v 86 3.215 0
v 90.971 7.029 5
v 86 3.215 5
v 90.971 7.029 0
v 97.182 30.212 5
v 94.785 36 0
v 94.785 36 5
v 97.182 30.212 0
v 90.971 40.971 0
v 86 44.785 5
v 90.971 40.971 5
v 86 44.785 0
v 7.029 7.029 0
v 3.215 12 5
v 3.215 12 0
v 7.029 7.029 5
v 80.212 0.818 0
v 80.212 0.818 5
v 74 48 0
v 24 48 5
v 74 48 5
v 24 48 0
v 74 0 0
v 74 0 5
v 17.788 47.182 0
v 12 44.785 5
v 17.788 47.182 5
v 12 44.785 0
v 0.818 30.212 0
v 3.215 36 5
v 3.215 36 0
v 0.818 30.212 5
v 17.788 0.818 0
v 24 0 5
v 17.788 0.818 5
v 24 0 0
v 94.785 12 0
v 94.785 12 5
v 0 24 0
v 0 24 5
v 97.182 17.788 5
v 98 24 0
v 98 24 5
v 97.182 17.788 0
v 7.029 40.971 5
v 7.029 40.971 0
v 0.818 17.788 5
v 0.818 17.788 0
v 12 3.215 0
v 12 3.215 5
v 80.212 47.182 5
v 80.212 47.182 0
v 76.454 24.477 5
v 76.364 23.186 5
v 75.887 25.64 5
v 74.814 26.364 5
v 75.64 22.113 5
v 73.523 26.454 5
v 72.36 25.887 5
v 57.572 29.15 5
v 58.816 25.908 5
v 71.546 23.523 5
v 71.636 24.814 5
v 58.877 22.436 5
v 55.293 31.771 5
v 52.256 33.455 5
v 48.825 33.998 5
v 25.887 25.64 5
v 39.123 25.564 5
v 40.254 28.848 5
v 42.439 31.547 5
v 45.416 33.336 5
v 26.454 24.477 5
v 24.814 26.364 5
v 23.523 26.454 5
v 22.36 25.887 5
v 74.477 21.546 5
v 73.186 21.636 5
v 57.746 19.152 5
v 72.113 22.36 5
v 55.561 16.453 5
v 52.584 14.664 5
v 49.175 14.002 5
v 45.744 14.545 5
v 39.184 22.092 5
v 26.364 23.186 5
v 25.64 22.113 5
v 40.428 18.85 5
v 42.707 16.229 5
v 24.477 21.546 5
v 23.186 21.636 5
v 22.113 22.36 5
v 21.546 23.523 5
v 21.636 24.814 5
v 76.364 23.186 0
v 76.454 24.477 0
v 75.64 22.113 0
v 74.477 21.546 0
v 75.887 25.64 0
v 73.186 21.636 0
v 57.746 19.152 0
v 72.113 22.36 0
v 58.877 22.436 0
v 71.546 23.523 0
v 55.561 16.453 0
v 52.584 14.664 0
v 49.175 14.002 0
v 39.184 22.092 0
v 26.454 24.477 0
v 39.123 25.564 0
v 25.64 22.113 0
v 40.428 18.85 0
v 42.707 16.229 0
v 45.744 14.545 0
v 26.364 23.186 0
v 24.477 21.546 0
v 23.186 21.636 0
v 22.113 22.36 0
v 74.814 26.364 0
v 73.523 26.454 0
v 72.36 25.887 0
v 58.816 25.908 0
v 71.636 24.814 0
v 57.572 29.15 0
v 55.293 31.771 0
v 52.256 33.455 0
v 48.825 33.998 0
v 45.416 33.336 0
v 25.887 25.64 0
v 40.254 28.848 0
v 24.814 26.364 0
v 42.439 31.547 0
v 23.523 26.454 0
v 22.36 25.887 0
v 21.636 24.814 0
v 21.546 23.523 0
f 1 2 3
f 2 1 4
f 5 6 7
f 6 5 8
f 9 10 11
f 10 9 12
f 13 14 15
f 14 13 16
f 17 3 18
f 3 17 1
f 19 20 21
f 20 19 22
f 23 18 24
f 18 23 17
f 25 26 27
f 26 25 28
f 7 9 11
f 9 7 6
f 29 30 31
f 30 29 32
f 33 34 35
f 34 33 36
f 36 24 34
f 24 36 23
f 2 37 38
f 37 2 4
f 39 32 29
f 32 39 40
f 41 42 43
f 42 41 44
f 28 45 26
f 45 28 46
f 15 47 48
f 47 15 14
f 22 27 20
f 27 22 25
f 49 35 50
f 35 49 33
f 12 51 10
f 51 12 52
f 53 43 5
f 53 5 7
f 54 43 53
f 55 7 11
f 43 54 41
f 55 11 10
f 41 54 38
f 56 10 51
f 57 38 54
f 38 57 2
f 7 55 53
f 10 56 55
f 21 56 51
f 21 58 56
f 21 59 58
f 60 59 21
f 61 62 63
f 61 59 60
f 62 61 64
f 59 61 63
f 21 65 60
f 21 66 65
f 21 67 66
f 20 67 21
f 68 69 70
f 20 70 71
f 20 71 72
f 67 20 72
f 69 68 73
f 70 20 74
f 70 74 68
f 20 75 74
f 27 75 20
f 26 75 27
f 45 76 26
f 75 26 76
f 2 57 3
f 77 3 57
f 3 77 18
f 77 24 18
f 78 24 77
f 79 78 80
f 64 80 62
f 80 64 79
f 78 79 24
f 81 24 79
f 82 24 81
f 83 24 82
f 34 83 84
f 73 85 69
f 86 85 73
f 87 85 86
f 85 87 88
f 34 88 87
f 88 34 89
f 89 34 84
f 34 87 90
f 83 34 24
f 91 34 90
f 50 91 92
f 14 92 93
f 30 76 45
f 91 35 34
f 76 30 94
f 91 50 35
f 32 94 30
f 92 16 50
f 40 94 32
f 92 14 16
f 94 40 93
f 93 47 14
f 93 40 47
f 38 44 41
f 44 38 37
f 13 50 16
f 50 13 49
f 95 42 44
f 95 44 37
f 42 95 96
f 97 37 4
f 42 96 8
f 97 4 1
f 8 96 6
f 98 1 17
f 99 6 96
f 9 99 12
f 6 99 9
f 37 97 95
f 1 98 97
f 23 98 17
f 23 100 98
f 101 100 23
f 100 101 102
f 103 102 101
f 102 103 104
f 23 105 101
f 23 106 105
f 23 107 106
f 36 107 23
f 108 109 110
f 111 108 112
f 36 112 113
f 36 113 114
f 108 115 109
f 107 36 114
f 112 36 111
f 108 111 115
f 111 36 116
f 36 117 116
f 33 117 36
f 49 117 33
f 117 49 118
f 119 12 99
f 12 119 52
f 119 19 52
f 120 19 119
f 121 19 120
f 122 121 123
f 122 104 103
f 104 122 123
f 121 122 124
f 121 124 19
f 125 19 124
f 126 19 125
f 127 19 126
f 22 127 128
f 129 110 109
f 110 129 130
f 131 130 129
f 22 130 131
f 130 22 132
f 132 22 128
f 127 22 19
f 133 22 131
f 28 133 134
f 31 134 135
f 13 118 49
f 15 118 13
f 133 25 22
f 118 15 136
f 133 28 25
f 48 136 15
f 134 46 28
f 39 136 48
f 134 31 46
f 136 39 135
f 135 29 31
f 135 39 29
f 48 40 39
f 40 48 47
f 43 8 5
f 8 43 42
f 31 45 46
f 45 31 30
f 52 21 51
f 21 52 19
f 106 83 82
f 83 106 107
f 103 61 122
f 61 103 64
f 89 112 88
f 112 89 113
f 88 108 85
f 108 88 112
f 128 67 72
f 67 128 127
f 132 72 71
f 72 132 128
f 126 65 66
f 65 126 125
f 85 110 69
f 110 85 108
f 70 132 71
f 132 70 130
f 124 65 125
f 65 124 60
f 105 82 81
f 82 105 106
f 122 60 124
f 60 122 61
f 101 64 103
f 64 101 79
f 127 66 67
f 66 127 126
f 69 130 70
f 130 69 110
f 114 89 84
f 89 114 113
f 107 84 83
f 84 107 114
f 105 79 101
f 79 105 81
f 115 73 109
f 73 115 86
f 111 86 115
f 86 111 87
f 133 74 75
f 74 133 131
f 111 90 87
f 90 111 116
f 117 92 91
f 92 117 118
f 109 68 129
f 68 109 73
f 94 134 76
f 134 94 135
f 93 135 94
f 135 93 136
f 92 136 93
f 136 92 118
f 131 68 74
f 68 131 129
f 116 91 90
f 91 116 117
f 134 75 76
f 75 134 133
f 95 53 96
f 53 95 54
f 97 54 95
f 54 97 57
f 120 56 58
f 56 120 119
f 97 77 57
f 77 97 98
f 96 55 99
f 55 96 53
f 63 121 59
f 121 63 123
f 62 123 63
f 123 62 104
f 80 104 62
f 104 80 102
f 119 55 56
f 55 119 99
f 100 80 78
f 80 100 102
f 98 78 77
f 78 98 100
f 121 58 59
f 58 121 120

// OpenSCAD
$fn = 32;

// ----------------------------------------------------------------------
// Spacer plate: obround span 50, caps R24
// ----------------------------------------------------------------------

// --- parameters (mm) ---
bore_r = 10;              // centre bore radius
bolt_r = 2.5;             // bolt hole radius
plate_t = 5;              // plate thickness, Z (extrusion height)
span = 50;                // obround span
cap_r = 24;               // cap radius

profile = [[24, 48], [17.788, 47.182], [12, 44.785], [7.029, 40.971], [3.215, 36], [0.818, 30.212], [0, 24], [0.818, 17.788], [3.215, 12], [7.029, 7.029], [12, 3.215], [17.788, 0.818], [24, 0], [74, 0], [80.212, 0.818], [86, 3.215], [90.971, 7.029], [94.785, 12], [97.182, 17.788], [98, 24], [97.182, 30.212], [94.785, 36], [90.971, 40.971], [86, 44.785], [80.212, 47.182], [74, 48]];  // primary outline, 26 points, counter clockwise
void_1 = [[58.816, 25.908], [57.572, 29.15], [55.293, 31.771], [52.256, 33.455], [48.825, 33.998], [45.416, 33.336], [42.439, 31.547], [40.254, 28.848], [39.123, 25.564], [39.184, 22.092], [40.428, 18.85], [42.707, 16.229], [45.744, 14.545], [49.175, 14.002], [52.584, 14.664], [55.561, 16.453], [57.746, 19.152], [58.877, 22.436]];  // centre bore, 18 points
void_2 = [[26.454, 24.477], [25.887, 25.64], [24.814, 26.364], [23.523, 26.454], [22.36, 25.887], [21.636, 24.814], [21.546, 23.523], [22.113, 22.36], [23.186, 21.636], [24.477, 21.546], [25.64, 22.113], [26.364, 23.186]];  // end hole, 12 points
void_3 = [[76.454, 24.477], [75.887, 25.64], [74.814, 26.364], [73.523, 26.454], [72.36, 25.887], [71.636, 24.814], [71.546, 23.523], [72.113, 22.36], [73.186, 21.636], [74.477, 21.546], [75.64, 22.113], [76.364, 23.186]];  // end hole, 12 points

// --- the one profile operation ---
difference() {
  linear_extrude(height = plate_t) polygon(points = profile);
  translate([0, 0, -1])
    linear_extrude(height = plate_t + 2) polygon(points = void_1);
  translate([0, 0, -1])
    linear_extrude(height = plate_t + 2) polygon(points = void_2);
  translate([0, 0, -1])
    linear_extrude(height = plate_t + 2) polygon(points = void_3);
}
